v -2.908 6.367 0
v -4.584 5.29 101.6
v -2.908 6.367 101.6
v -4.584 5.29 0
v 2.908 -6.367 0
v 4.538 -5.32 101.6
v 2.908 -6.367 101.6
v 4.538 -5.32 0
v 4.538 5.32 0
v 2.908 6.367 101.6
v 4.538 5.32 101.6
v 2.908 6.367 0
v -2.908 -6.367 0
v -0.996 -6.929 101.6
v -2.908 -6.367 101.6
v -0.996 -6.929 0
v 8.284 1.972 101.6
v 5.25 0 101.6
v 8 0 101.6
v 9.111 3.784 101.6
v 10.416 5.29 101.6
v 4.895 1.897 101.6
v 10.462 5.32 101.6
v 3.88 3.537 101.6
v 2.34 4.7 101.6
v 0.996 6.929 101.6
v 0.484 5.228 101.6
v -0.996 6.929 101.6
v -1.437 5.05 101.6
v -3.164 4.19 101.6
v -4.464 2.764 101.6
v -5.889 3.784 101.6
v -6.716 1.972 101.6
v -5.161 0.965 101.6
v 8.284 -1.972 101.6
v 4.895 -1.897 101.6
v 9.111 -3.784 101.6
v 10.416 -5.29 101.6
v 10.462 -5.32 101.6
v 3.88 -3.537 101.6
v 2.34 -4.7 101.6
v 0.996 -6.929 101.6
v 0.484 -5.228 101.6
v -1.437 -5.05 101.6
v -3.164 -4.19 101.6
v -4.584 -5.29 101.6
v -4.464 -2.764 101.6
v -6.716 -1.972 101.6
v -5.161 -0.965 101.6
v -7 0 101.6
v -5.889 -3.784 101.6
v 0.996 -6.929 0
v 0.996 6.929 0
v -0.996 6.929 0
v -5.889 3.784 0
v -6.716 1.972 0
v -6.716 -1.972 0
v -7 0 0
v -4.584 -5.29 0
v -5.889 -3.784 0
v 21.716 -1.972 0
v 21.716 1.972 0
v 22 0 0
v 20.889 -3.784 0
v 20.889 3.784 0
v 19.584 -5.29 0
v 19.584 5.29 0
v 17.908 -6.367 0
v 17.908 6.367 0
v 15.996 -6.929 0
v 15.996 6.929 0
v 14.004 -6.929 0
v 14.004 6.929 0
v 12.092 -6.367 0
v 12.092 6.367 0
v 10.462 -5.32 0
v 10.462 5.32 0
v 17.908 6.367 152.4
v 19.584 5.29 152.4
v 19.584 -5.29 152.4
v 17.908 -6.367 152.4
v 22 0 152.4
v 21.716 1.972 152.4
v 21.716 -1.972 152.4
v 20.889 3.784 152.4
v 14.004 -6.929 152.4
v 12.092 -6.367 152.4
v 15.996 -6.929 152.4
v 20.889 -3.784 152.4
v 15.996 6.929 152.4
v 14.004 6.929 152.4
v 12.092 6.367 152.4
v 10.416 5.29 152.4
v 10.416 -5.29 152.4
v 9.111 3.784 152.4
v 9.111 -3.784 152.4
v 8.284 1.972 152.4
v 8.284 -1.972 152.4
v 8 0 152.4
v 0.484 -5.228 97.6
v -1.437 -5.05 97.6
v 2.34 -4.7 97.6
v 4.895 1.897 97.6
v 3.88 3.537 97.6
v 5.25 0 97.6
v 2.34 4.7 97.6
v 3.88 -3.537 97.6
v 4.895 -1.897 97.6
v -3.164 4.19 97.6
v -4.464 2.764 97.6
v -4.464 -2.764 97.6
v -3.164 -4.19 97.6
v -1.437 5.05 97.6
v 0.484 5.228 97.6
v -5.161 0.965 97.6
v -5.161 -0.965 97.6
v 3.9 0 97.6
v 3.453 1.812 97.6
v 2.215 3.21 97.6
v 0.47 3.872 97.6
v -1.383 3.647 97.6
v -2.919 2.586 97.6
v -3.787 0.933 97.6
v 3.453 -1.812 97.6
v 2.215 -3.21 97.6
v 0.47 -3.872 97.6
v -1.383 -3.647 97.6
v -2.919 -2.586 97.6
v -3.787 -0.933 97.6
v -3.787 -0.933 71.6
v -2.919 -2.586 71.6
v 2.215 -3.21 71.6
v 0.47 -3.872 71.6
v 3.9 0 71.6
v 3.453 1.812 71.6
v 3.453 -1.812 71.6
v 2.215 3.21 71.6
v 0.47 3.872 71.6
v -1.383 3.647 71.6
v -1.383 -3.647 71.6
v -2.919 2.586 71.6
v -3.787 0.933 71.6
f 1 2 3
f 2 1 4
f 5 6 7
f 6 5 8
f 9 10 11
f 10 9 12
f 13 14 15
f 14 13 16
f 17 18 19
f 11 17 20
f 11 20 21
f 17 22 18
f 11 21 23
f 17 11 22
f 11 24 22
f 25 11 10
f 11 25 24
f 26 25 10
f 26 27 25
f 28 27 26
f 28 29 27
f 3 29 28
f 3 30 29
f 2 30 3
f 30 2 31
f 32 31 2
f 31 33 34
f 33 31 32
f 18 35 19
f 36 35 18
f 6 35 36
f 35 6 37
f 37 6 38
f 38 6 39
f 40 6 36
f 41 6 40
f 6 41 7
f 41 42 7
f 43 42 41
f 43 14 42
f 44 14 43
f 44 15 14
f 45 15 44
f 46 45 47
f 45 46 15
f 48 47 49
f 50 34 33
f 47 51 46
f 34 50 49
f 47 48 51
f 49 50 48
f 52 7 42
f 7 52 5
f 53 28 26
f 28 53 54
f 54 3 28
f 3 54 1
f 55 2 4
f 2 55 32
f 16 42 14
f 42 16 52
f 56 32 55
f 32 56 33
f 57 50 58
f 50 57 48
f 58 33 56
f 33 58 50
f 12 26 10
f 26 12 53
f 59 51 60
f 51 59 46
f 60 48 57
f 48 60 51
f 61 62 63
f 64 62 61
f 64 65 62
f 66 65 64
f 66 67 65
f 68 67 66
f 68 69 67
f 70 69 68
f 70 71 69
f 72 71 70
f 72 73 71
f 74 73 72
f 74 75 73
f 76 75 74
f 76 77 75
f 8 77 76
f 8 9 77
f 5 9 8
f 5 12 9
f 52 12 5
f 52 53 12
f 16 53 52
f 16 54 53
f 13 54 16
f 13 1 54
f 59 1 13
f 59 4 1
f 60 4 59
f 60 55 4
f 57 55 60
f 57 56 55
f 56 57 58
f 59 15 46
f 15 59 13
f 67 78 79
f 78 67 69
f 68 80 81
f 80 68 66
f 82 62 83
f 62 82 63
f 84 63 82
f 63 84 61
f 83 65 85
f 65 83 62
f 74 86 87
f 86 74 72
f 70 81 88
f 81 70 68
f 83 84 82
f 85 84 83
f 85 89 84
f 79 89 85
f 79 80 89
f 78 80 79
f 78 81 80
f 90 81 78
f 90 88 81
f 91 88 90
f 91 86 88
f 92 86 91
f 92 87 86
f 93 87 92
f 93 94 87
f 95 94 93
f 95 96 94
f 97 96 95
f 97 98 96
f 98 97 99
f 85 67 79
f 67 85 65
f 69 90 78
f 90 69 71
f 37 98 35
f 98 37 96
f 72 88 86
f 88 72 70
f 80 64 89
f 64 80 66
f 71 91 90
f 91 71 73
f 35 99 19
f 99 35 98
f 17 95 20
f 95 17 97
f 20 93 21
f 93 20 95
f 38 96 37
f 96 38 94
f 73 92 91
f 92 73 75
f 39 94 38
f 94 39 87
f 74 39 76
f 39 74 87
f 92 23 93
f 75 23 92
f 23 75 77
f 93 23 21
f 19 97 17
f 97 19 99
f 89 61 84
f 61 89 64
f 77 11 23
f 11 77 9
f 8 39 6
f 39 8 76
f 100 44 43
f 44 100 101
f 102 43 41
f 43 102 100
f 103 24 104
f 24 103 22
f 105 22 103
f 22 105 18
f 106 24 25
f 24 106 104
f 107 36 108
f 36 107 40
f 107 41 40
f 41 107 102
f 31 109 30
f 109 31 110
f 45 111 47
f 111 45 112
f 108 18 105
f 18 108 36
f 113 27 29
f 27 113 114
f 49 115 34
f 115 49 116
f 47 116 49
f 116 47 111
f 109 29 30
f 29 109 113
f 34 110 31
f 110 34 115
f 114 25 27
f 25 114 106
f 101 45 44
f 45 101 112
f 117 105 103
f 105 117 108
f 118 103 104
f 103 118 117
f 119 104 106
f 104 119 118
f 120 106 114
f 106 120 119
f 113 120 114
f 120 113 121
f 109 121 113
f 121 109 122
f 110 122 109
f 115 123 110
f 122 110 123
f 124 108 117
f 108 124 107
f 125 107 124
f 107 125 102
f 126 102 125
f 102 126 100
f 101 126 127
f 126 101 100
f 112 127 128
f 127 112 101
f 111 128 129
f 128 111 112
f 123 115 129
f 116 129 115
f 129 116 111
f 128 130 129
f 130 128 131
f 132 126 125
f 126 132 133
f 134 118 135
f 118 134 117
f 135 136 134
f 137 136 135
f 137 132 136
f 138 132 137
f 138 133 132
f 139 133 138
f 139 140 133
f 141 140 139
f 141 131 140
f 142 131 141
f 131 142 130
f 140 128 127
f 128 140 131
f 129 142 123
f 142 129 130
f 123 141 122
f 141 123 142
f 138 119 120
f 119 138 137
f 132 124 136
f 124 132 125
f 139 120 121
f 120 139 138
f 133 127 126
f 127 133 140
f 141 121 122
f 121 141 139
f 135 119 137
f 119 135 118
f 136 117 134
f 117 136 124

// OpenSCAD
inch=25.4;

aa_l = 2*inch;
aa_d = 14.0;

barrel_shroud_diameter = 10.5;
barrel_shroud_height = 4.0;
barrel_thread_diameter = 7.8;
//barrel_flat_height = 8.7;
barrel_h_safe = 30;

gap=1;
length_multiplier = 3;

mid_h=.76*aa_d;
module body(){
    cylinder(d=aa_d,h=aa_l*(length_multiplier-1));
    translate([aa_d+gap,0,0]) cylinder(d=aa_d,h=aa_l*length_multiplier);
    translate([0,-.5*mid_h,0]) cube([aa_d+gap, mid_h,aa_l*(length_multiplier-1)]);
}

module terminal_neg(){
    translate([0,0,-barrel_shroud_height]) cylinder(d=barrel_shroud_diameter, h=barrel_shroud_height+.1);
    mirror([0,0,1])
            cylinder(h=barrel_h_safe, d=barrel_thread_diameter);
//    mirror([0,0,1])%cylinder(d=aa_d,h=aa_l);
}

difference(){
    body();
    translate([0,0,aa_l*(length_multiplier-1)]) terminal_neg();
}
//terminal_neg();
